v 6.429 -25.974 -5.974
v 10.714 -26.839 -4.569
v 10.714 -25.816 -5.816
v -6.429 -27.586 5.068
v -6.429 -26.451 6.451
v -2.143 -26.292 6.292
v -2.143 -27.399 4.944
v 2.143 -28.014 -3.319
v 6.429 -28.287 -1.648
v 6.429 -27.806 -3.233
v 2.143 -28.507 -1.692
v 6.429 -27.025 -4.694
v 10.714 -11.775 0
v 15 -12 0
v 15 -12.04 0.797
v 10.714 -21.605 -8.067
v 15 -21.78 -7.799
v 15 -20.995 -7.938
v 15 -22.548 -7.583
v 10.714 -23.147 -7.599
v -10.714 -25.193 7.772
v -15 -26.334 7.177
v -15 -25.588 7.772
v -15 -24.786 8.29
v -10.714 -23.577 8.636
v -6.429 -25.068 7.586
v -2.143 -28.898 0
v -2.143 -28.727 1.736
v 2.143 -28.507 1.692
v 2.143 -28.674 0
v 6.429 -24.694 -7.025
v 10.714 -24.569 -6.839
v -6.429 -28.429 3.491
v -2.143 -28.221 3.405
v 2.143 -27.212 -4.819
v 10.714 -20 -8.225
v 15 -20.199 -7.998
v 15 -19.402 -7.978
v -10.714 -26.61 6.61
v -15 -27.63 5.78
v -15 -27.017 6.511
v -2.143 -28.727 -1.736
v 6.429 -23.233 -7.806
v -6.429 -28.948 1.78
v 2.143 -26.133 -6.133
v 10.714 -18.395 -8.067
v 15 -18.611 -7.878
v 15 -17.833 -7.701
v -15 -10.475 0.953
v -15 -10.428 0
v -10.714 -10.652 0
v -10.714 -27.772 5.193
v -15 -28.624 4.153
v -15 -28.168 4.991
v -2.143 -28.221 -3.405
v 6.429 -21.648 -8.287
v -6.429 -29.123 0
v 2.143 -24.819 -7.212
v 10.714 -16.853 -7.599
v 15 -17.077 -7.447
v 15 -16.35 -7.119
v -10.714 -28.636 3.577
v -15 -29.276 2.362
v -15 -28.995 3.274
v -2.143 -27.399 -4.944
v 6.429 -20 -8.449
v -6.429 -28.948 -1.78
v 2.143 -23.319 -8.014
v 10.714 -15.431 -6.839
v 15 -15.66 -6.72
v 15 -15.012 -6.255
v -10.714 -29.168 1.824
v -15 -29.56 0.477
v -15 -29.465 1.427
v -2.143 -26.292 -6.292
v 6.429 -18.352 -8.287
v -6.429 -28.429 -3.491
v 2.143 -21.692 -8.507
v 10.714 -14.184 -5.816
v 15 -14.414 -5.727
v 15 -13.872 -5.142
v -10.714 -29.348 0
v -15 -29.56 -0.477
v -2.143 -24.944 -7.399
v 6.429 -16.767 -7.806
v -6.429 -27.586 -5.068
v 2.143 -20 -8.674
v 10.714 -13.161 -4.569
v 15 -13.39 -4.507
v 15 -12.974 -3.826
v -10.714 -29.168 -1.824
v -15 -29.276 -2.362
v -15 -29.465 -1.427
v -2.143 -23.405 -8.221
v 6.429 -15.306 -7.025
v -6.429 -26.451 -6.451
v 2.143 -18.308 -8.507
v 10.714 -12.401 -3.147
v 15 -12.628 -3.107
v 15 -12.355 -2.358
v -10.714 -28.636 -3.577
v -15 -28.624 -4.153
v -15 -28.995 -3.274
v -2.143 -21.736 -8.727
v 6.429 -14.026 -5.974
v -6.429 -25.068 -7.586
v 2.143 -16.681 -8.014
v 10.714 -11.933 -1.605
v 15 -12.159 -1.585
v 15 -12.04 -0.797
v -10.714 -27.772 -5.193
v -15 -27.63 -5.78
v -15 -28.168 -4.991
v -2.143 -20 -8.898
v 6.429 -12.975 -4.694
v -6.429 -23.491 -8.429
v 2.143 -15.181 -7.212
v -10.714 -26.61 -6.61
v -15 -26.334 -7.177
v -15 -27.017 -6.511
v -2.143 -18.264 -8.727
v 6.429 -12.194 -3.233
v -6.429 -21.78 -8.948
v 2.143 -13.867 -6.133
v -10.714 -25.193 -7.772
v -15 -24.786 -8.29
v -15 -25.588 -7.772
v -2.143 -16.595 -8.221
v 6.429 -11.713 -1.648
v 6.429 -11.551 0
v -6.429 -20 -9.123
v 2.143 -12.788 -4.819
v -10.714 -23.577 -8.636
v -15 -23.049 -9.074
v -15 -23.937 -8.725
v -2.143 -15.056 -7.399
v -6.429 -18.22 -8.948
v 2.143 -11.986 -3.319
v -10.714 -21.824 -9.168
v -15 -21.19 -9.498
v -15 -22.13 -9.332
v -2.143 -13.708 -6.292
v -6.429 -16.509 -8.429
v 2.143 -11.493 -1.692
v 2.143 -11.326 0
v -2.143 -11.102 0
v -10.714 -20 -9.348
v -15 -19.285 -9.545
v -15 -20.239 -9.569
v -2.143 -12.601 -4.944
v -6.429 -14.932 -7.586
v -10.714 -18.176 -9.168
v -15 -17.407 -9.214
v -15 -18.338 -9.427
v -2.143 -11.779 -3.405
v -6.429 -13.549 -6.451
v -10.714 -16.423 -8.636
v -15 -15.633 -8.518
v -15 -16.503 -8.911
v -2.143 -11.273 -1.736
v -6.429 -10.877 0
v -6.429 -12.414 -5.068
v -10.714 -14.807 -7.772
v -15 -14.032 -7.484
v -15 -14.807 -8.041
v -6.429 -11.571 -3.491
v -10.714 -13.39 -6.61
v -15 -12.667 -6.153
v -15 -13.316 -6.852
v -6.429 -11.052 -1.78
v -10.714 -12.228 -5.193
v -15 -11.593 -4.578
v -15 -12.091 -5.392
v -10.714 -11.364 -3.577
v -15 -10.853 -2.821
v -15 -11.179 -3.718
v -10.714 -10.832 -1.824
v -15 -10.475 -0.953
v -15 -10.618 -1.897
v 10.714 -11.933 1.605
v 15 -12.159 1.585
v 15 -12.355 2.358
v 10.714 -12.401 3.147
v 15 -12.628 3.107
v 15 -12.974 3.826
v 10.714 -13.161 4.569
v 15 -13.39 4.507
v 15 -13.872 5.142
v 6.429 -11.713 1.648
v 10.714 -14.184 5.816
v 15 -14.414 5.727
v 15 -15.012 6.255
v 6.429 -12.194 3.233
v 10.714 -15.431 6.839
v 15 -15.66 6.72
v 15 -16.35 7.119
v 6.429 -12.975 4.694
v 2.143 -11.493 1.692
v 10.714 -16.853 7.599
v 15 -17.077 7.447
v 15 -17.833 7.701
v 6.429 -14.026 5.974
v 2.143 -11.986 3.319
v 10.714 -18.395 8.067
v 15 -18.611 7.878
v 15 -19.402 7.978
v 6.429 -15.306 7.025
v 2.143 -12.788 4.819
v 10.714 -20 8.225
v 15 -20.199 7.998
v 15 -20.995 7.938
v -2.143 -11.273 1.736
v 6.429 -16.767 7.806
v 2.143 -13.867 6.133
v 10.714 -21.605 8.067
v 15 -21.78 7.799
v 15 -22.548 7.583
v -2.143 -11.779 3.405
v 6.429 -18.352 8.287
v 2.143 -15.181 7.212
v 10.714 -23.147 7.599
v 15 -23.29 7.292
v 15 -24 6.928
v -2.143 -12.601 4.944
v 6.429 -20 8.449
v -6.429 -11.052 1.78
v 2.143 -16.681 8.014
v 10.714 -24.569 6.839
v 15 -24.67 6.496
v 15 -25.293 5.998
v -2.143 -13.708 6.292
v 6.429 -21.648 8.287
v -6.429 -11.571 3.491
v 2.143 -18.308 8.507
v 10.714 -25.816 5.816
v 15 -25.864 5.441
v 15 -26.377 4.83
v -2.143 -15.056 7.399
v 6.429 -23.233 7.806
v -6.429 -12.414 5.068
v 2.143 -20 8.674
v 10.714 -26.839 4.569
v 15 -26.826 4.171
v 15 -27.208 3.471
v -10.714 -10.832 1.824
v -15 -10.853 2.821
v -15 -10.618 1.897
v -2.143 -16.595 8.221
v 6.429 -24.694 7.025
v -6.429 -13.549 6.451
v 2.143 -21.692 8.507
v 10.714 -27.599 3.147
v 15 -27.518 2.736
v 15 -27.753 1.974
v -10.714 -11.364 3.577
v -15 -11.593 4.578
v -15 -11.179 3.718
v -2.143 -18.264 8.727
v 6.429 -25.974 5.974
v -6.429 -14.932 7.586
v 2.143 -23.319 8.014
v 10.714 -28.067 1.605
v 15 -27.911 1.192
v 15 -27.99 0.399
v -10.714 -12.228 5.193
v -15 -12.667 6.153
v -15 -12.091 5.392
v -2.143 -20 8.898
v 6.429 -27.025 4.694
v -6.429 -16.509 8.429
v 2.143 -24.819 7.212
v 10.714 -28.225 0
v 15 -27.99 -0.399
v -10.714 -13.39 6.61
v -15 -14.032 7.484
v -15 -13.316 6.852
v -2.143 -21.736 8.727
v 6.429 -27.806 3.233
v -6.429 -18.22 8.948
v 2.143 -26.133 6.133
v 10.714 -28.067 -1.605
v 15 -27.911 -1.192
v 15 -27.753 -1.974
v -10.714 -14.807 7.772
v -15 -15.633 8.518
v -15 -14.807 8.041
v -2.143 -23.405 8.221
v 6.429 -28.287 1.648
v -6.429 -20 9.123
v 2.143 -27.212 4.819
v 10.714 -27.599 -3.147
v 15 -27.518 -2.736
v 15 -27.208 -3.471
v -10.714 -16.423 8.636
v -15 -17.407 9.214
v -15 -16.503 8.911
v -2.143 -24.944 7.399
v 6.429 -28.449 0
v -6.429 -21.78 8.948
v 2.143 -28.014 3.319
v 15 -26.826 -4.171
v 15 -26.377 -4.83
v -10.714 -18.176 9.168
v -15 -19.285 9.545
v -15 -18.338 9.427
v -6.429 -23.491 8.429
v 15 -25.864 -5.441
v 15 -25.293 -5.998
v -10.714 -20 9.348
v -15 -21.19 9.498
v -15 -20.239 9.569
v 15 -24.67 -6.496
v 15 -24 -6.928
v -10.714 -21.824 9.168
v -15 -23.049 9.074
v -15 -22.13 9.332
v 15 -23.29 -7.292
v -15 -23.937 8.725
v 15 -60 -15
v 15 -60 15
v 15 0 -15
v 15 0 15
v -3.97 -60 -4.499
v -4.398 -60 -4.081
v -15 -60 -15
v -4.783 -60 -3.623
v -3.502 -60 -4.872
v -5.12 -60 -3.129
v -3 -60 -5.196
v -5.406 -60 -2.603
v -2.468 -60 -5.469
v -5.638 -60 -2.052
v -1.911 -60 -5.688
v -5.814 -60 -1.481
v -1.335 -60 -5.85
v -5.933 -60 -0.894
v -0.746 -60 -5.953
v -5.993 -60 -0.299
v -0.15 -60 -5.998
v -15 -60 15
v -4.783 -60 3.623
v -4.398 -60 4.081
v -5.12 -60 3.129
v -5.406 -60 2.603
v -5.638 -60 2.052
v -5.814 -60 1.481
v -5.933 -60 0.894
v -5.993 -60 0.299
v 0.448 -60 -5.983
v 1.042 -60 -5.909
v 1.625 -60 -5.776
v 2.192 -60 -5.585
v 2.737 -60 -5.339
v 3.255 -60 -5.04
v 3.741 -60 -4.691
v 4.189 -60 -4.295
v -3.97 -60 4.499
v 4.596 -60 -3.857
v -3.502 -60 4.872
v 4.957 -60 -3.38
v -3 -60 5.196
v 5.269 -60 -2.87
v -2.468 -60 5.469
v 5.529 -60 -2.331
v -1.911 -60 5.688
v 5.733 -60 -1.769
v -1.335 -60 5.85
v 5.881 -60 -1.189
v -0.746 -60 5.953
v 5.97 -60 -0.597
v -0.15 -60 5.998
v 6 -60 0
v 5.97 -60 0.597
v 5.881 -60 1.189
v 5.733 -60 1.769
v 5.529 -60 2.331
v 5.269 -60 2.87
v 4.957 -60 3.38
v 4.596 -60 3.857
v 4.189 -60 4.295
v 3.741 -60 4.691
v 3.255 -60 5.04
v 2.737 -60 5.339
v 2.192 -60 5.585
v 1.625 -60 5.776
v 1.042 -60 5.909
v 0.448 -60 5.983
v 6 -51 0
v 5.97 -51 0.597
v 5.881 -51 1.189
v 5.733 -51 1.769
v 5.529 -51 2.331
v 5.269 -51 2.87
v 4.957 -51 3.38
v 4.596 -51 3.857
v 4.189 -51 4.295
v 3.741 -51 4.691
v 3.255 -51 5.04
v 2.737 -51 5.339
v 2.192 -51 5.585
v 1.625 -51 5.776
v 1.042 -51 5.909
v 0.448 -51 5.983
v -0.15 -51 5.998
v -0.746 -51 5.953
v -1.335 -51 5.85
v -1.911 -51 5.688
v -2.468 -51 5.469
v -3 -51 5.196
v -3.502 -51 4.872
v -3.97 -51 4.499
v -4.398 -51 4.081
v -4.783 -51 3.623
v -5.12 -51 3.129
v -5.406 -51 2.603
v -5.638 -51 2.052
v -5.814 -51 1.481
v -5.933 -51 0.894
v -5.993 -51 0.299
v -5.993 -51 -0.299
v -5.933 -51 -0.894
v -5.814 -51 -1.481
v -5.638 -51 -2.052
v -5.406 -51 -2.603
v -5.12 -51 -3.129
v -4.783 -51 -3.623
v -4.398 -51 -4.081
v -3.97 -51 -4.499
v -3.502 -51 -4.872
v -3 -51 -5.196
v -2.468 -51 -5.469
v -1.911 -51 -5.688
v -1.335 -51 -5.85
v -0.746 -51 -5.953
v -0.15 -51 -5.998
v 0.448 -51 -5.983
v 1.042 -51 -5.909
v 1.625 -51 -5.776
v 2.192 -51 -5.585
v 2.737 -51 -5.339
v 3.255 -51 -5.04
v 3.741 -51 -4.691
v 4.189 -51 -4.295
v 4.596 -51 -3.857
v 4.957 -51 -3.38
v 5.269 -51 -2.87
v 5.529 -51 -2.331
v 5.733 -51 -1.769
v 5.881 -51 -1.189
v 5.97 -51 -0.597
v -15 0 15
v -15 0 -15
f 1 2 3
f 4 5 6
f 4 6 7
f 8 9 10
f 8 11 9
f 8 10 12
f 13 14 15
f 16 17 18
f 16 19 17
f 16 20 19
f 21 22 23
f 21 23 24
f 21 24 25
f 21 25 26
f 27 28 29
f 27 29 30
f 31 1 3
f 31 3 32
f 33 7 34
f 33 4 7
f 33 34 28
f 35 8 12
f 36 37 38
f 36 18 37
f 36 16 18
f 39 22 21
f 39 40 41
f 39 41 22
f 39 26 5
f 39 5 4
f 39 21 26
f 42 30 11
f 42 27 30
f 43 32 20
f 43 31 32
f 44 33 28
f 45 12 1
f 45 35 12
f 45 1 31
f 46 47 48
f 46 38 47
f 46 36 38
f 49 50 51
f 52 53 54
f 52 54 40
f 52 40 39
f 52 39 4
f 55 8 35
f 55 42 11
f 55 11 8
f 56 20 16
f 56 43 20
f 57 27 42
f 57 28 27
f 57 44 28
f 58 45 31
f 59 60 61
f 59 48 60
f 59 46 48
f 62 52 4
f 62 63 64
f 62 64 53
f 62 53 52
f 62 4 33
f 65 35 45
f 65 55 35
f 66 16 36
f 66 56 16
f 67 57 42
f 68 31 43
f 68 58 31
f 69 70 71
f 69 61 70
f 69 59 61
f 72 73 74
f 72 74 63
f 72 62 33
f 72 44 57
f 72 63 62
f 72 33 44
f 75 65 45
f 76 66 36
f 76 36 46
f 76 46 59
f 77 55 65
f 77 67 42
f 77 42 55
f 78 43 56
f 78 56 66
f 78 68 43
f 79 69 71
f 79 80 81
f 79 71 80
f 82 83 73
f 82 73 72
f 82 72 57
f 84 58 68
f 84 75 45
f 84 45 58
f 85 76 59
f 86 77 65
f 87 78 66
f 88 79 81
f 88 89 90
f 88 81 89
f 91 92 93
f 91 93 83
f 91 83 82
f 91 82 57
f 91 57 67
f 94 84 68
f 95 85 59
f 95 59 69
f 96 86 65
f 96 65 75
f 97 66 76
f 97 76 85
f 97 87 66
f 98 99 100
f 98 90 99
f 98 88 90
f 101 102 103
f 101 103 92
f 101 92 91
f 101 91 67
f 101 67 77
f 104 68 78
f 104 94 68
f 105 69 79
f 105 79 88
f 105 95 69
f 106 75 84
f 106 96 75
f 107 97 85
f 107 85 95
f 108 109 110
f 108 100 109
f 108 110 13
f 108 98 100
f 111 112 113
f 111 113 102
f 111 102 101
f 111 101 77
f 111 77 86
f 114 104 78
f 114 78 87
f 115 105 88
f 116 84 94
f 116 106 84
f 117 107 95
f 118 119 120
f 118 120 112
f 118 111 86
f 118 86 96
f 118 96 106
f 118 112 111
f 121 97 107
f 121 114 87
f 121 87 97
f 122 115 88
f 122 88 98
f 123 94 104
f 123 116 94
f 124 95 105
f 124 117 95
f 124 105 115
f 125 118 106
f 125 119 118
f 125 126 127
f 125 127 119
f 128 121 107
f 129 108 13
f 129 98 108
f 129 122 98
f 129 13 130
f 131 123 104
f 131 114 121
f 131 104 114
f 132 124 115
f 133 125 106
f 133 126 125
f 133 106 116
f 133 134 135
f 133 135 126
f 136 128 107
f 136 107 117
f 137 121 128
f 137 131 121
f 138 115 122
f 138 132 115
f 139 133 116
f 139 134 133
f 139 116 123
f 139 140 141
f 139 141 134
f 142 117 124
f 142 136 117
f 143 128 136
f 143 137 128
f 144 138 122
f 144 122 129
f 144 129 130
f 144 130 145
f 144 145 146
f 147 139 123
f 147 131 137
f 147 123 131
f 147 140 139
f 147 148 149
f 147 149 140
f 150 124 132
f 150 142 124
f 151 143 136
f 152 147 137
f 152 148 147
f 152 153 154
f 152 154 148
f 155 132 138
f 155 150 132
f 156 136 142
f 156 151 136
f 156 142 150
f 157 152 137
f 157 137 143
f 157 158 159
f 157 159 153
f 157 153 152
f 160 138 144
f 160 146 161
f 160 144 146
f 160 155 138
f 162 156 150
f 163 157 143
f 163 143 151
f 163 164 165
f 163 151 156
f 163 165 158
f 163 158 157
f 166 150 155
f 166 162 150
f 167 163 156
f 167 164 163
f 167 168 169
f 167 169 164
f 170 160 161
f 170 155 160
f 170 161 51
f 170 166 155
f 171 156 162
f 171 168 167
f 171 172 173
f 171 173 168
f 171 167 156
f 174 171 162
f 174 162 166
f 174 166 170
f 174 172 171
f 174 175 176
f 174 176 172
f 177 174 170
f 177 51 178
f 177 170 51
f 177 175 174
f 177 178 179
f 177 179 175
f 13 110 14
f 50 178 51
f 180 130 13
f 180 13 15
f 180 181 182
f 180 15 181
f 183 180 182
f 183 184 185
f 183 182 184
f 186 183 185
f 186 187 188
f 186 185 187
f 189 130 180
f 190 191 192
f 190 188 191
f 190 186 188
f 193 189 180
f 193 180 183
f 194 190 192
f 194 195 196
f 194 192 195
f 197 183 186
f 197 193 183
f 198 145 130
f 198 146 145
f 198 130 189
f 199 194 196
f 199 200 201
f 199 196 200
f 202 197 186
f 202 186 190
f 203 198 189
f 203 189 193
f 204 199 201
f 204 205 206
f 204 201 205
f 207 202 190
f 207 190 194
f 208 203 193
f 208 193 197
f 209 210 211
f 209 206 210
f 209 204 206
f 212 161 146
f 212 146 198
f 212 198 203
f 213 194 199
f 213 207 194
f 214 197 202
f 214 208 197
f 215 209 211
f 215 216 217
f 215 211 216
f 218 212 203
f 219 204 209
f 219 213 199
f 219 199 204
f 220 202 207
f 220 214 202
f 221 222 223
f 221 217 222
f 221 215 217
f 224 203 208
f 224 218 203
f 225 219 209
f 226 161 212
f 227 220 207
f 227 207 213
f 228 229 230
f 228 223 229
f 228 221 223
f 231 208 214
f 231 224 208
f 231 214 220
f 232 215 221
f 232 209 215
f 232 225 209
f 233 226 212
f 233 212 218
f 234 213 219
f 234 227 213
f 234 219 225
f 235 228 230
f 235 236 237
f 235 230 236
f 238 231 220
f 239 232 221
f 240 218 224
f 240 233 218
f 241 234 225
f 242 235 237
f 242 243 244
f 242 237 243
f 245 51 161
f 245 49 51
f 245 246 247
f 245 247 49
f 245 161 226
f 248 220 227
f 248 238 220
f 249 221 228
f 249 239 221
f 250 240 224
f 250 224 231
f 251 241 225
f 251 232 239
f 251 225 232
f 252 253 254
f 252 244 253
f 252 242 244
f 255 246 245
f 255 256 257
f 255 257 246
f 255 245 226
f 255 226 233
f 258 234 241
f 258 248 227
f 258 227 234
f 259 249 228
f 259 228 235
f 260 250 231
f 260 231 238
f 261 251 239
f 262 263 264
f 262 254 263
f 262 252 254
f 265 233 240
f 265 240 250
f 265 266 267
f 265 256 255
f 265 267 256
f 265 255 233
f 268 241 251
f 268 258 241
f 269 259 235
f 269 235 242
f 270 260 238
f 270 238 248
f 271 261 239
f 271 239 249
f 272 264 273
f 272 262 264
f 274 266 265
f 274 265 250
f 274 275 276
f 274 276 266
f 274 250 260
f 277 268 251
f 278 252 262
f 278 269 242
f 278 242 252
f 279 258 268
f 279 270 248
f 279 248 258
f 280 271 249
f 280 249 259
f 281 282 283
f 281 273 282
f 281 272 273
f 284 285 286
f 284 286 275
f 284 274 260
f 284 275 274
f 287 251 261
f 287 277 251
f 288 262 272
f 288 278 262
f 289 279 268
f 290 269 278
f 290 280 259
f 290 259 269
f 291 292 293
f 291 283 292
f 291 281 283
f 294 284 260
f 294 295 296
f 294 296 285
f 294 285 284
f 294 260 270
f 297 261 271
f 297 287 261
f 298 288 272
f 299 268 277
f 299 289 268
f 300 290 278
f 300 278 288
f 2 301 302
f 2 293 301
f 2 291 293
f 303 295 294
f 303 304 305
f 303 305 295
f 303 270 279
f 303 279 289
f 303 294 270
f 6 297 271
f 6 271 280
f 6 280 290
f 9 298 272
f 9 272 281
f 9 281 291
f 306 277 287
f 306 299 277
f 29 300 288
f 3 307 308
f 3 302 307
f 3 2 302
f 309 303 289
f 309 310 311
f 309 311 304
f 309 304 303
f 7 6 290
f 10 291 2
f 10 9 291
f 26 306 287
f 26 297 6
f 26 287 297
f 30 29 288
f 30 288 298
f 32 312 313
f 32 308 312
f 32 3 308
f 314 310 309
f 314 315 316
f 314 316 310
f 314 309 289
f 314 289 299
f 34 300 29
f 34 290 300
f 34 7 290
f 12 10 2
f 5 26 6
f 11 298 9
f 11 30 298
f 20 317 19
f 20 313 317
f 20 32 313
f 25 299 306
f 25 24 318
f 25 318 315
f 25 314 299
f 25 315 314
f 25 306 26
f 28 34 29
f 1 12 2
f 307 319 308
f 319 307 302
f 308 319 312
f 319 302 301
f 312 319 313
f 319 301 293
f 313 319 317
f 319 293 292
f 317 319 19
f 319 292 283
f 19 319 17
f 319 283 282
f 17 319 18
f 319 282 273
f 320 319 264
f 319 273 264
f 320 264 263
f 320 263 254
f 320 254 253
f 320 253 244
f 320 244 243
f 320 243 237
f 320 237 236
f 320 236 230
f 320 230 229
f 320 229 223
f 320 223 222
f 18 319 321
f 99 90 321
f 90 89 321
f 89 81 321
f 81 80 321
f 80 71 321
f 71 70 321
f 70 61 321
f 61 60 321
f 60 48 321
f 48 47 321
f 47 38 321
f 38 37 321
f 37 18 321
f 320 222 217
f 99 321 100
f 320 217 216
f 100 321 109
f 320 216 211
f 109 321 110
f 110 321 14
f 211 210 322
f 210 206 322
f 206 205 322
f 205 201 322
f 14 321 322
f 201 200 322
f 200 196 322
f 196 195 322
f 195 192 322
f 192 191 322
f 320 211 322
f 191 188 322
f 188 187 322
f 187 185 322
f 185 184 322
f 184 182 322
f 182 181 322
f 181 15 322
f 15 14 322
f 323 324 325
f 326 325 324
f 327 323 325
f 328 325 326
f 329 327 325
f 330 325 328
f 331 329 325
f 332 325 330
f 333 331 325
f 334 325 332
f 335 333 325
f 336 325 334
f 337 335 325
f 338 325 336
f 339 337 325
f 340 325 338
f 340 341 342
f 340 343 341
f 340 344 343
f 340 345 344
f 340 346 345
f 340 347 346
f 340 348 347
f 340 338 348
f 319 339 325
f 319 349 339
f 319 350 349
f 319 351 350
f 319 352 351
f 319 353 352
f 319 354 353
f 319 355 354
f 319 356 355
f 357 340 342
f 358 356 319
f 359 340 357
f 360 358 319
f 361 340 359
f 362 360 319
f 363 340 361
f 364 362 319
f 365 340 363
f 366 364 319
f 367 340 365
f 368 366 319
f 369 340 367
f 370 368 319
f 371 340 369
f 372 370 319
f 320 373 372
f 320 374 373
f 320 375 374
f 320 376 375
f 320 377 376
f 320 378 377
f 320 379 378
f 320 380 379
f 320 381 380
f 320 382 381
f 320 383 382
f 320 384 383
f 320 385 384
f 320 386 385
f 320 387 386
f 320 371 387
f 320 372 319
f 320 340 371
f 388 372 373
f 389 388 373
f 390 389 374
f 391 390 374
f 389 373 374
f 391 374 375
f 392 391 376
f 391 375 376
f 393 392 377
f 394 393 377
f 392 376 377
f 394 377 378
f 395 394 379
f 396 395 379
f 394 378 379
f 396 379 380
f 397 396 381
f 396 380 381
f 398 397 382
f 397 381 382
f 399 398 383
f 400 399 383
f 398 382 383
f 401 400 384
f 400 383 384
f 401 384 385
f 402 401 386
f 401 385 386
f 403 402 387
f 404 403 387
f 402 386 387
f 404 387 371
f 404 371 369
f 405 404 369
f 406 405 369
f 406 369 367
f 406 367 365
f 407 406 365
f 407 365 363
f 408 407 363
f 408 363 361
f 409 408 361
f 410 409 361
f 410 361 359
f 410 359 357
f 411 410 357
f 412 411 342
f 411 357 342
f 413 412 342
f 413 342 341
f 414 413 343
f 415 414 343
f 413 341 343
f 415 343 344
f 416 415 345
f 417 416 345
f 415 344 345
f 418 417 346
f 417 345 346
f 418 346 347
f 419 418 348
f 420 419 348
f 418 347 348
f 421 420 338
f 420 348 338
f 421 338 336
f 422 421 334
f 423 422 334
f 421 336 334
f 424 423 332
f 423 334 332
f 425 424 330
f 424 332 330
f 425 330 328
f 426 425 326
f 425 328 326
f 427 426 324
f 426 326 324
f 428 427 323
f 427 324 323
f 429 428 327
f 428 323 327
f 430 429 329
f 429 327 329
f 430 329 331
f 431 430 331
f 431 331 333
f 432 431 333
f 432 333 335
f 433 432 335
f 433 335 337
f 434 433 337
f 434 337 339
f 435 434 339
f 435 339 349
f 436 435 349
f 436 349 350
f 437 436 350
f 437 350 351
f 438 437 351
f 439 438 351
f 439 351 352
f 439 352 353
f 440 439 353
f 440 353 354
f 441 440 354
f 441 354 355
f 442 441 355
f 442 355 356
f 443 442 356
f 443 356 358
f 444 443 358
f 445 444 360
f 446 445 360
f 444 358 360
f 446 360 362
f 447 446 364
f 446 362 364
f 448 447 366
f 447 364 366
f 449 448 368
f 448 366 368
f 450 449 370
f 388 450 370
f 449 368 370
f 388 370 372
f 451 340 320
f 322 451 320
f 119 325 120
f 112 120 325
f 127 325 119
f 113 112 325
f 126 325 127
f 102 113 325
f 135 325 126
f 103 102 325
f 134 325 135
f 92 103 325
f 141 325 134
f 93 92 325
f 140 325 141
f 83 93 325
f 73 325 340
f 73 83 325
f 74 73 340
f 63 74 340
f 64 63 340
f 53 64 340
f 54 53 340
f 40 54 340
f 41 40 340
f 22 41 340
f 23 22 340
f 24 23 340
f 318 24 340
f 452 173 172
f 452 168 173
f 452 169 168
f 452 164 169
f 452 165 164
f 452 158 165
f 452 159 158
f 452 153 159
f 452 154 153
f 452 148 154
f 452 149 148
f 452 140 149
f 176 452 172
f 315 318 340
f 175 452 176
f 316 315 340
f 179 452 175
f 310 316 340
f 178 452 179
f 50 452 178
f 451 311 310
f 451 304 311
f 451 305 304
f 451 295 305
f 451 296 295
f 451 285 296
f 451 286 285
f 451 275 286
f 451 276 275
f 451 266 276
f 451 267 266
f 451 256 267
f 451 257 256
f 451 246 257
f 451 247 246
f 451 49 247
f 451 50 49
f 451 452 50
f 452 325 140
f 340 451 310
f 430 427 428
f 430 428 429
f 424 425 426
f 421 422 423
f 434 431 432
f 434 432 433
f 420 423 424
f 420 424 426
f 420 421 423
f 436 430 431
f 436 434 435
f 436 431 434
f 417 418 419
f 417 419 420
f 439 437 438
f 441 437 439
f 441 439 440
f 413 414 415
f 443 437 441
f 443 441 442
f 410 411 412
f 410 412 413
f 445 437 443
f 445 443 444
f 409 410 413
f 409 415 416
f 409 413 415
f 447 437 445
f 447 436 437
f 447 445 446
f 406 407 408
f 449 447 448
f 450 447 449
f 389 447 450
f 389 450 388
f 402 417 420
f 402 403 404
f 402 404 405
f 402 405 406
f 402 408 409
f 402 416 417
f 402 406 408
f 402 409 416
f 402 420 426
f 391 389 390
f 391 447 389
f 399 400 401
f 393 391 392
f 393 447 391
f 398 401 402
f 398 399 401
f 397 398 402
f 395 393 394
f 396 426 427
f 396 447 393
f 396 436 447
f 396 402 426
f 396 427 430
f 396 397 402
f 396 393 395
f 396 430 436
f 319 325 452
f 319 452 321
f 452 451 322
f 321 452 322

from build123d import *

# Parameters (mm, degrees)
F0_W     = 30
F0_H     = 30
F1_DEPTH = 60
F2_R     = 8
F3_DEPTH = 30.001
F3_TAPER = -3
F4_R     = 6
F5_DEPTH = 9


with BuildPart() as f1:
    # F0 (on Front) → F1 (new body)
    with BuildSketch(Plane.XZ):
        Rectangle(F0_W, F0_H)
    extrude(amount=F1_DEPTH)

    # F2 (on face) → F3 (cut, through all)
    with BuildSketch(Plane.YZ.offset(15)):
        with Locations((-20, 0)):
            Circle(F2_R)
    extrude(amount=-F3_DEPTH, taper=F3_TAPER, mode=Mode.SUBTRACT)

    # F4 (on face) → F5 (cut)
    with BuildSketch(Plane.XZ.offset(60)):
        Circle(F4_R)
    extrude(amount=-F5_DEPTH, mode=Mode.SUBTRACT)


solid = f1.part
